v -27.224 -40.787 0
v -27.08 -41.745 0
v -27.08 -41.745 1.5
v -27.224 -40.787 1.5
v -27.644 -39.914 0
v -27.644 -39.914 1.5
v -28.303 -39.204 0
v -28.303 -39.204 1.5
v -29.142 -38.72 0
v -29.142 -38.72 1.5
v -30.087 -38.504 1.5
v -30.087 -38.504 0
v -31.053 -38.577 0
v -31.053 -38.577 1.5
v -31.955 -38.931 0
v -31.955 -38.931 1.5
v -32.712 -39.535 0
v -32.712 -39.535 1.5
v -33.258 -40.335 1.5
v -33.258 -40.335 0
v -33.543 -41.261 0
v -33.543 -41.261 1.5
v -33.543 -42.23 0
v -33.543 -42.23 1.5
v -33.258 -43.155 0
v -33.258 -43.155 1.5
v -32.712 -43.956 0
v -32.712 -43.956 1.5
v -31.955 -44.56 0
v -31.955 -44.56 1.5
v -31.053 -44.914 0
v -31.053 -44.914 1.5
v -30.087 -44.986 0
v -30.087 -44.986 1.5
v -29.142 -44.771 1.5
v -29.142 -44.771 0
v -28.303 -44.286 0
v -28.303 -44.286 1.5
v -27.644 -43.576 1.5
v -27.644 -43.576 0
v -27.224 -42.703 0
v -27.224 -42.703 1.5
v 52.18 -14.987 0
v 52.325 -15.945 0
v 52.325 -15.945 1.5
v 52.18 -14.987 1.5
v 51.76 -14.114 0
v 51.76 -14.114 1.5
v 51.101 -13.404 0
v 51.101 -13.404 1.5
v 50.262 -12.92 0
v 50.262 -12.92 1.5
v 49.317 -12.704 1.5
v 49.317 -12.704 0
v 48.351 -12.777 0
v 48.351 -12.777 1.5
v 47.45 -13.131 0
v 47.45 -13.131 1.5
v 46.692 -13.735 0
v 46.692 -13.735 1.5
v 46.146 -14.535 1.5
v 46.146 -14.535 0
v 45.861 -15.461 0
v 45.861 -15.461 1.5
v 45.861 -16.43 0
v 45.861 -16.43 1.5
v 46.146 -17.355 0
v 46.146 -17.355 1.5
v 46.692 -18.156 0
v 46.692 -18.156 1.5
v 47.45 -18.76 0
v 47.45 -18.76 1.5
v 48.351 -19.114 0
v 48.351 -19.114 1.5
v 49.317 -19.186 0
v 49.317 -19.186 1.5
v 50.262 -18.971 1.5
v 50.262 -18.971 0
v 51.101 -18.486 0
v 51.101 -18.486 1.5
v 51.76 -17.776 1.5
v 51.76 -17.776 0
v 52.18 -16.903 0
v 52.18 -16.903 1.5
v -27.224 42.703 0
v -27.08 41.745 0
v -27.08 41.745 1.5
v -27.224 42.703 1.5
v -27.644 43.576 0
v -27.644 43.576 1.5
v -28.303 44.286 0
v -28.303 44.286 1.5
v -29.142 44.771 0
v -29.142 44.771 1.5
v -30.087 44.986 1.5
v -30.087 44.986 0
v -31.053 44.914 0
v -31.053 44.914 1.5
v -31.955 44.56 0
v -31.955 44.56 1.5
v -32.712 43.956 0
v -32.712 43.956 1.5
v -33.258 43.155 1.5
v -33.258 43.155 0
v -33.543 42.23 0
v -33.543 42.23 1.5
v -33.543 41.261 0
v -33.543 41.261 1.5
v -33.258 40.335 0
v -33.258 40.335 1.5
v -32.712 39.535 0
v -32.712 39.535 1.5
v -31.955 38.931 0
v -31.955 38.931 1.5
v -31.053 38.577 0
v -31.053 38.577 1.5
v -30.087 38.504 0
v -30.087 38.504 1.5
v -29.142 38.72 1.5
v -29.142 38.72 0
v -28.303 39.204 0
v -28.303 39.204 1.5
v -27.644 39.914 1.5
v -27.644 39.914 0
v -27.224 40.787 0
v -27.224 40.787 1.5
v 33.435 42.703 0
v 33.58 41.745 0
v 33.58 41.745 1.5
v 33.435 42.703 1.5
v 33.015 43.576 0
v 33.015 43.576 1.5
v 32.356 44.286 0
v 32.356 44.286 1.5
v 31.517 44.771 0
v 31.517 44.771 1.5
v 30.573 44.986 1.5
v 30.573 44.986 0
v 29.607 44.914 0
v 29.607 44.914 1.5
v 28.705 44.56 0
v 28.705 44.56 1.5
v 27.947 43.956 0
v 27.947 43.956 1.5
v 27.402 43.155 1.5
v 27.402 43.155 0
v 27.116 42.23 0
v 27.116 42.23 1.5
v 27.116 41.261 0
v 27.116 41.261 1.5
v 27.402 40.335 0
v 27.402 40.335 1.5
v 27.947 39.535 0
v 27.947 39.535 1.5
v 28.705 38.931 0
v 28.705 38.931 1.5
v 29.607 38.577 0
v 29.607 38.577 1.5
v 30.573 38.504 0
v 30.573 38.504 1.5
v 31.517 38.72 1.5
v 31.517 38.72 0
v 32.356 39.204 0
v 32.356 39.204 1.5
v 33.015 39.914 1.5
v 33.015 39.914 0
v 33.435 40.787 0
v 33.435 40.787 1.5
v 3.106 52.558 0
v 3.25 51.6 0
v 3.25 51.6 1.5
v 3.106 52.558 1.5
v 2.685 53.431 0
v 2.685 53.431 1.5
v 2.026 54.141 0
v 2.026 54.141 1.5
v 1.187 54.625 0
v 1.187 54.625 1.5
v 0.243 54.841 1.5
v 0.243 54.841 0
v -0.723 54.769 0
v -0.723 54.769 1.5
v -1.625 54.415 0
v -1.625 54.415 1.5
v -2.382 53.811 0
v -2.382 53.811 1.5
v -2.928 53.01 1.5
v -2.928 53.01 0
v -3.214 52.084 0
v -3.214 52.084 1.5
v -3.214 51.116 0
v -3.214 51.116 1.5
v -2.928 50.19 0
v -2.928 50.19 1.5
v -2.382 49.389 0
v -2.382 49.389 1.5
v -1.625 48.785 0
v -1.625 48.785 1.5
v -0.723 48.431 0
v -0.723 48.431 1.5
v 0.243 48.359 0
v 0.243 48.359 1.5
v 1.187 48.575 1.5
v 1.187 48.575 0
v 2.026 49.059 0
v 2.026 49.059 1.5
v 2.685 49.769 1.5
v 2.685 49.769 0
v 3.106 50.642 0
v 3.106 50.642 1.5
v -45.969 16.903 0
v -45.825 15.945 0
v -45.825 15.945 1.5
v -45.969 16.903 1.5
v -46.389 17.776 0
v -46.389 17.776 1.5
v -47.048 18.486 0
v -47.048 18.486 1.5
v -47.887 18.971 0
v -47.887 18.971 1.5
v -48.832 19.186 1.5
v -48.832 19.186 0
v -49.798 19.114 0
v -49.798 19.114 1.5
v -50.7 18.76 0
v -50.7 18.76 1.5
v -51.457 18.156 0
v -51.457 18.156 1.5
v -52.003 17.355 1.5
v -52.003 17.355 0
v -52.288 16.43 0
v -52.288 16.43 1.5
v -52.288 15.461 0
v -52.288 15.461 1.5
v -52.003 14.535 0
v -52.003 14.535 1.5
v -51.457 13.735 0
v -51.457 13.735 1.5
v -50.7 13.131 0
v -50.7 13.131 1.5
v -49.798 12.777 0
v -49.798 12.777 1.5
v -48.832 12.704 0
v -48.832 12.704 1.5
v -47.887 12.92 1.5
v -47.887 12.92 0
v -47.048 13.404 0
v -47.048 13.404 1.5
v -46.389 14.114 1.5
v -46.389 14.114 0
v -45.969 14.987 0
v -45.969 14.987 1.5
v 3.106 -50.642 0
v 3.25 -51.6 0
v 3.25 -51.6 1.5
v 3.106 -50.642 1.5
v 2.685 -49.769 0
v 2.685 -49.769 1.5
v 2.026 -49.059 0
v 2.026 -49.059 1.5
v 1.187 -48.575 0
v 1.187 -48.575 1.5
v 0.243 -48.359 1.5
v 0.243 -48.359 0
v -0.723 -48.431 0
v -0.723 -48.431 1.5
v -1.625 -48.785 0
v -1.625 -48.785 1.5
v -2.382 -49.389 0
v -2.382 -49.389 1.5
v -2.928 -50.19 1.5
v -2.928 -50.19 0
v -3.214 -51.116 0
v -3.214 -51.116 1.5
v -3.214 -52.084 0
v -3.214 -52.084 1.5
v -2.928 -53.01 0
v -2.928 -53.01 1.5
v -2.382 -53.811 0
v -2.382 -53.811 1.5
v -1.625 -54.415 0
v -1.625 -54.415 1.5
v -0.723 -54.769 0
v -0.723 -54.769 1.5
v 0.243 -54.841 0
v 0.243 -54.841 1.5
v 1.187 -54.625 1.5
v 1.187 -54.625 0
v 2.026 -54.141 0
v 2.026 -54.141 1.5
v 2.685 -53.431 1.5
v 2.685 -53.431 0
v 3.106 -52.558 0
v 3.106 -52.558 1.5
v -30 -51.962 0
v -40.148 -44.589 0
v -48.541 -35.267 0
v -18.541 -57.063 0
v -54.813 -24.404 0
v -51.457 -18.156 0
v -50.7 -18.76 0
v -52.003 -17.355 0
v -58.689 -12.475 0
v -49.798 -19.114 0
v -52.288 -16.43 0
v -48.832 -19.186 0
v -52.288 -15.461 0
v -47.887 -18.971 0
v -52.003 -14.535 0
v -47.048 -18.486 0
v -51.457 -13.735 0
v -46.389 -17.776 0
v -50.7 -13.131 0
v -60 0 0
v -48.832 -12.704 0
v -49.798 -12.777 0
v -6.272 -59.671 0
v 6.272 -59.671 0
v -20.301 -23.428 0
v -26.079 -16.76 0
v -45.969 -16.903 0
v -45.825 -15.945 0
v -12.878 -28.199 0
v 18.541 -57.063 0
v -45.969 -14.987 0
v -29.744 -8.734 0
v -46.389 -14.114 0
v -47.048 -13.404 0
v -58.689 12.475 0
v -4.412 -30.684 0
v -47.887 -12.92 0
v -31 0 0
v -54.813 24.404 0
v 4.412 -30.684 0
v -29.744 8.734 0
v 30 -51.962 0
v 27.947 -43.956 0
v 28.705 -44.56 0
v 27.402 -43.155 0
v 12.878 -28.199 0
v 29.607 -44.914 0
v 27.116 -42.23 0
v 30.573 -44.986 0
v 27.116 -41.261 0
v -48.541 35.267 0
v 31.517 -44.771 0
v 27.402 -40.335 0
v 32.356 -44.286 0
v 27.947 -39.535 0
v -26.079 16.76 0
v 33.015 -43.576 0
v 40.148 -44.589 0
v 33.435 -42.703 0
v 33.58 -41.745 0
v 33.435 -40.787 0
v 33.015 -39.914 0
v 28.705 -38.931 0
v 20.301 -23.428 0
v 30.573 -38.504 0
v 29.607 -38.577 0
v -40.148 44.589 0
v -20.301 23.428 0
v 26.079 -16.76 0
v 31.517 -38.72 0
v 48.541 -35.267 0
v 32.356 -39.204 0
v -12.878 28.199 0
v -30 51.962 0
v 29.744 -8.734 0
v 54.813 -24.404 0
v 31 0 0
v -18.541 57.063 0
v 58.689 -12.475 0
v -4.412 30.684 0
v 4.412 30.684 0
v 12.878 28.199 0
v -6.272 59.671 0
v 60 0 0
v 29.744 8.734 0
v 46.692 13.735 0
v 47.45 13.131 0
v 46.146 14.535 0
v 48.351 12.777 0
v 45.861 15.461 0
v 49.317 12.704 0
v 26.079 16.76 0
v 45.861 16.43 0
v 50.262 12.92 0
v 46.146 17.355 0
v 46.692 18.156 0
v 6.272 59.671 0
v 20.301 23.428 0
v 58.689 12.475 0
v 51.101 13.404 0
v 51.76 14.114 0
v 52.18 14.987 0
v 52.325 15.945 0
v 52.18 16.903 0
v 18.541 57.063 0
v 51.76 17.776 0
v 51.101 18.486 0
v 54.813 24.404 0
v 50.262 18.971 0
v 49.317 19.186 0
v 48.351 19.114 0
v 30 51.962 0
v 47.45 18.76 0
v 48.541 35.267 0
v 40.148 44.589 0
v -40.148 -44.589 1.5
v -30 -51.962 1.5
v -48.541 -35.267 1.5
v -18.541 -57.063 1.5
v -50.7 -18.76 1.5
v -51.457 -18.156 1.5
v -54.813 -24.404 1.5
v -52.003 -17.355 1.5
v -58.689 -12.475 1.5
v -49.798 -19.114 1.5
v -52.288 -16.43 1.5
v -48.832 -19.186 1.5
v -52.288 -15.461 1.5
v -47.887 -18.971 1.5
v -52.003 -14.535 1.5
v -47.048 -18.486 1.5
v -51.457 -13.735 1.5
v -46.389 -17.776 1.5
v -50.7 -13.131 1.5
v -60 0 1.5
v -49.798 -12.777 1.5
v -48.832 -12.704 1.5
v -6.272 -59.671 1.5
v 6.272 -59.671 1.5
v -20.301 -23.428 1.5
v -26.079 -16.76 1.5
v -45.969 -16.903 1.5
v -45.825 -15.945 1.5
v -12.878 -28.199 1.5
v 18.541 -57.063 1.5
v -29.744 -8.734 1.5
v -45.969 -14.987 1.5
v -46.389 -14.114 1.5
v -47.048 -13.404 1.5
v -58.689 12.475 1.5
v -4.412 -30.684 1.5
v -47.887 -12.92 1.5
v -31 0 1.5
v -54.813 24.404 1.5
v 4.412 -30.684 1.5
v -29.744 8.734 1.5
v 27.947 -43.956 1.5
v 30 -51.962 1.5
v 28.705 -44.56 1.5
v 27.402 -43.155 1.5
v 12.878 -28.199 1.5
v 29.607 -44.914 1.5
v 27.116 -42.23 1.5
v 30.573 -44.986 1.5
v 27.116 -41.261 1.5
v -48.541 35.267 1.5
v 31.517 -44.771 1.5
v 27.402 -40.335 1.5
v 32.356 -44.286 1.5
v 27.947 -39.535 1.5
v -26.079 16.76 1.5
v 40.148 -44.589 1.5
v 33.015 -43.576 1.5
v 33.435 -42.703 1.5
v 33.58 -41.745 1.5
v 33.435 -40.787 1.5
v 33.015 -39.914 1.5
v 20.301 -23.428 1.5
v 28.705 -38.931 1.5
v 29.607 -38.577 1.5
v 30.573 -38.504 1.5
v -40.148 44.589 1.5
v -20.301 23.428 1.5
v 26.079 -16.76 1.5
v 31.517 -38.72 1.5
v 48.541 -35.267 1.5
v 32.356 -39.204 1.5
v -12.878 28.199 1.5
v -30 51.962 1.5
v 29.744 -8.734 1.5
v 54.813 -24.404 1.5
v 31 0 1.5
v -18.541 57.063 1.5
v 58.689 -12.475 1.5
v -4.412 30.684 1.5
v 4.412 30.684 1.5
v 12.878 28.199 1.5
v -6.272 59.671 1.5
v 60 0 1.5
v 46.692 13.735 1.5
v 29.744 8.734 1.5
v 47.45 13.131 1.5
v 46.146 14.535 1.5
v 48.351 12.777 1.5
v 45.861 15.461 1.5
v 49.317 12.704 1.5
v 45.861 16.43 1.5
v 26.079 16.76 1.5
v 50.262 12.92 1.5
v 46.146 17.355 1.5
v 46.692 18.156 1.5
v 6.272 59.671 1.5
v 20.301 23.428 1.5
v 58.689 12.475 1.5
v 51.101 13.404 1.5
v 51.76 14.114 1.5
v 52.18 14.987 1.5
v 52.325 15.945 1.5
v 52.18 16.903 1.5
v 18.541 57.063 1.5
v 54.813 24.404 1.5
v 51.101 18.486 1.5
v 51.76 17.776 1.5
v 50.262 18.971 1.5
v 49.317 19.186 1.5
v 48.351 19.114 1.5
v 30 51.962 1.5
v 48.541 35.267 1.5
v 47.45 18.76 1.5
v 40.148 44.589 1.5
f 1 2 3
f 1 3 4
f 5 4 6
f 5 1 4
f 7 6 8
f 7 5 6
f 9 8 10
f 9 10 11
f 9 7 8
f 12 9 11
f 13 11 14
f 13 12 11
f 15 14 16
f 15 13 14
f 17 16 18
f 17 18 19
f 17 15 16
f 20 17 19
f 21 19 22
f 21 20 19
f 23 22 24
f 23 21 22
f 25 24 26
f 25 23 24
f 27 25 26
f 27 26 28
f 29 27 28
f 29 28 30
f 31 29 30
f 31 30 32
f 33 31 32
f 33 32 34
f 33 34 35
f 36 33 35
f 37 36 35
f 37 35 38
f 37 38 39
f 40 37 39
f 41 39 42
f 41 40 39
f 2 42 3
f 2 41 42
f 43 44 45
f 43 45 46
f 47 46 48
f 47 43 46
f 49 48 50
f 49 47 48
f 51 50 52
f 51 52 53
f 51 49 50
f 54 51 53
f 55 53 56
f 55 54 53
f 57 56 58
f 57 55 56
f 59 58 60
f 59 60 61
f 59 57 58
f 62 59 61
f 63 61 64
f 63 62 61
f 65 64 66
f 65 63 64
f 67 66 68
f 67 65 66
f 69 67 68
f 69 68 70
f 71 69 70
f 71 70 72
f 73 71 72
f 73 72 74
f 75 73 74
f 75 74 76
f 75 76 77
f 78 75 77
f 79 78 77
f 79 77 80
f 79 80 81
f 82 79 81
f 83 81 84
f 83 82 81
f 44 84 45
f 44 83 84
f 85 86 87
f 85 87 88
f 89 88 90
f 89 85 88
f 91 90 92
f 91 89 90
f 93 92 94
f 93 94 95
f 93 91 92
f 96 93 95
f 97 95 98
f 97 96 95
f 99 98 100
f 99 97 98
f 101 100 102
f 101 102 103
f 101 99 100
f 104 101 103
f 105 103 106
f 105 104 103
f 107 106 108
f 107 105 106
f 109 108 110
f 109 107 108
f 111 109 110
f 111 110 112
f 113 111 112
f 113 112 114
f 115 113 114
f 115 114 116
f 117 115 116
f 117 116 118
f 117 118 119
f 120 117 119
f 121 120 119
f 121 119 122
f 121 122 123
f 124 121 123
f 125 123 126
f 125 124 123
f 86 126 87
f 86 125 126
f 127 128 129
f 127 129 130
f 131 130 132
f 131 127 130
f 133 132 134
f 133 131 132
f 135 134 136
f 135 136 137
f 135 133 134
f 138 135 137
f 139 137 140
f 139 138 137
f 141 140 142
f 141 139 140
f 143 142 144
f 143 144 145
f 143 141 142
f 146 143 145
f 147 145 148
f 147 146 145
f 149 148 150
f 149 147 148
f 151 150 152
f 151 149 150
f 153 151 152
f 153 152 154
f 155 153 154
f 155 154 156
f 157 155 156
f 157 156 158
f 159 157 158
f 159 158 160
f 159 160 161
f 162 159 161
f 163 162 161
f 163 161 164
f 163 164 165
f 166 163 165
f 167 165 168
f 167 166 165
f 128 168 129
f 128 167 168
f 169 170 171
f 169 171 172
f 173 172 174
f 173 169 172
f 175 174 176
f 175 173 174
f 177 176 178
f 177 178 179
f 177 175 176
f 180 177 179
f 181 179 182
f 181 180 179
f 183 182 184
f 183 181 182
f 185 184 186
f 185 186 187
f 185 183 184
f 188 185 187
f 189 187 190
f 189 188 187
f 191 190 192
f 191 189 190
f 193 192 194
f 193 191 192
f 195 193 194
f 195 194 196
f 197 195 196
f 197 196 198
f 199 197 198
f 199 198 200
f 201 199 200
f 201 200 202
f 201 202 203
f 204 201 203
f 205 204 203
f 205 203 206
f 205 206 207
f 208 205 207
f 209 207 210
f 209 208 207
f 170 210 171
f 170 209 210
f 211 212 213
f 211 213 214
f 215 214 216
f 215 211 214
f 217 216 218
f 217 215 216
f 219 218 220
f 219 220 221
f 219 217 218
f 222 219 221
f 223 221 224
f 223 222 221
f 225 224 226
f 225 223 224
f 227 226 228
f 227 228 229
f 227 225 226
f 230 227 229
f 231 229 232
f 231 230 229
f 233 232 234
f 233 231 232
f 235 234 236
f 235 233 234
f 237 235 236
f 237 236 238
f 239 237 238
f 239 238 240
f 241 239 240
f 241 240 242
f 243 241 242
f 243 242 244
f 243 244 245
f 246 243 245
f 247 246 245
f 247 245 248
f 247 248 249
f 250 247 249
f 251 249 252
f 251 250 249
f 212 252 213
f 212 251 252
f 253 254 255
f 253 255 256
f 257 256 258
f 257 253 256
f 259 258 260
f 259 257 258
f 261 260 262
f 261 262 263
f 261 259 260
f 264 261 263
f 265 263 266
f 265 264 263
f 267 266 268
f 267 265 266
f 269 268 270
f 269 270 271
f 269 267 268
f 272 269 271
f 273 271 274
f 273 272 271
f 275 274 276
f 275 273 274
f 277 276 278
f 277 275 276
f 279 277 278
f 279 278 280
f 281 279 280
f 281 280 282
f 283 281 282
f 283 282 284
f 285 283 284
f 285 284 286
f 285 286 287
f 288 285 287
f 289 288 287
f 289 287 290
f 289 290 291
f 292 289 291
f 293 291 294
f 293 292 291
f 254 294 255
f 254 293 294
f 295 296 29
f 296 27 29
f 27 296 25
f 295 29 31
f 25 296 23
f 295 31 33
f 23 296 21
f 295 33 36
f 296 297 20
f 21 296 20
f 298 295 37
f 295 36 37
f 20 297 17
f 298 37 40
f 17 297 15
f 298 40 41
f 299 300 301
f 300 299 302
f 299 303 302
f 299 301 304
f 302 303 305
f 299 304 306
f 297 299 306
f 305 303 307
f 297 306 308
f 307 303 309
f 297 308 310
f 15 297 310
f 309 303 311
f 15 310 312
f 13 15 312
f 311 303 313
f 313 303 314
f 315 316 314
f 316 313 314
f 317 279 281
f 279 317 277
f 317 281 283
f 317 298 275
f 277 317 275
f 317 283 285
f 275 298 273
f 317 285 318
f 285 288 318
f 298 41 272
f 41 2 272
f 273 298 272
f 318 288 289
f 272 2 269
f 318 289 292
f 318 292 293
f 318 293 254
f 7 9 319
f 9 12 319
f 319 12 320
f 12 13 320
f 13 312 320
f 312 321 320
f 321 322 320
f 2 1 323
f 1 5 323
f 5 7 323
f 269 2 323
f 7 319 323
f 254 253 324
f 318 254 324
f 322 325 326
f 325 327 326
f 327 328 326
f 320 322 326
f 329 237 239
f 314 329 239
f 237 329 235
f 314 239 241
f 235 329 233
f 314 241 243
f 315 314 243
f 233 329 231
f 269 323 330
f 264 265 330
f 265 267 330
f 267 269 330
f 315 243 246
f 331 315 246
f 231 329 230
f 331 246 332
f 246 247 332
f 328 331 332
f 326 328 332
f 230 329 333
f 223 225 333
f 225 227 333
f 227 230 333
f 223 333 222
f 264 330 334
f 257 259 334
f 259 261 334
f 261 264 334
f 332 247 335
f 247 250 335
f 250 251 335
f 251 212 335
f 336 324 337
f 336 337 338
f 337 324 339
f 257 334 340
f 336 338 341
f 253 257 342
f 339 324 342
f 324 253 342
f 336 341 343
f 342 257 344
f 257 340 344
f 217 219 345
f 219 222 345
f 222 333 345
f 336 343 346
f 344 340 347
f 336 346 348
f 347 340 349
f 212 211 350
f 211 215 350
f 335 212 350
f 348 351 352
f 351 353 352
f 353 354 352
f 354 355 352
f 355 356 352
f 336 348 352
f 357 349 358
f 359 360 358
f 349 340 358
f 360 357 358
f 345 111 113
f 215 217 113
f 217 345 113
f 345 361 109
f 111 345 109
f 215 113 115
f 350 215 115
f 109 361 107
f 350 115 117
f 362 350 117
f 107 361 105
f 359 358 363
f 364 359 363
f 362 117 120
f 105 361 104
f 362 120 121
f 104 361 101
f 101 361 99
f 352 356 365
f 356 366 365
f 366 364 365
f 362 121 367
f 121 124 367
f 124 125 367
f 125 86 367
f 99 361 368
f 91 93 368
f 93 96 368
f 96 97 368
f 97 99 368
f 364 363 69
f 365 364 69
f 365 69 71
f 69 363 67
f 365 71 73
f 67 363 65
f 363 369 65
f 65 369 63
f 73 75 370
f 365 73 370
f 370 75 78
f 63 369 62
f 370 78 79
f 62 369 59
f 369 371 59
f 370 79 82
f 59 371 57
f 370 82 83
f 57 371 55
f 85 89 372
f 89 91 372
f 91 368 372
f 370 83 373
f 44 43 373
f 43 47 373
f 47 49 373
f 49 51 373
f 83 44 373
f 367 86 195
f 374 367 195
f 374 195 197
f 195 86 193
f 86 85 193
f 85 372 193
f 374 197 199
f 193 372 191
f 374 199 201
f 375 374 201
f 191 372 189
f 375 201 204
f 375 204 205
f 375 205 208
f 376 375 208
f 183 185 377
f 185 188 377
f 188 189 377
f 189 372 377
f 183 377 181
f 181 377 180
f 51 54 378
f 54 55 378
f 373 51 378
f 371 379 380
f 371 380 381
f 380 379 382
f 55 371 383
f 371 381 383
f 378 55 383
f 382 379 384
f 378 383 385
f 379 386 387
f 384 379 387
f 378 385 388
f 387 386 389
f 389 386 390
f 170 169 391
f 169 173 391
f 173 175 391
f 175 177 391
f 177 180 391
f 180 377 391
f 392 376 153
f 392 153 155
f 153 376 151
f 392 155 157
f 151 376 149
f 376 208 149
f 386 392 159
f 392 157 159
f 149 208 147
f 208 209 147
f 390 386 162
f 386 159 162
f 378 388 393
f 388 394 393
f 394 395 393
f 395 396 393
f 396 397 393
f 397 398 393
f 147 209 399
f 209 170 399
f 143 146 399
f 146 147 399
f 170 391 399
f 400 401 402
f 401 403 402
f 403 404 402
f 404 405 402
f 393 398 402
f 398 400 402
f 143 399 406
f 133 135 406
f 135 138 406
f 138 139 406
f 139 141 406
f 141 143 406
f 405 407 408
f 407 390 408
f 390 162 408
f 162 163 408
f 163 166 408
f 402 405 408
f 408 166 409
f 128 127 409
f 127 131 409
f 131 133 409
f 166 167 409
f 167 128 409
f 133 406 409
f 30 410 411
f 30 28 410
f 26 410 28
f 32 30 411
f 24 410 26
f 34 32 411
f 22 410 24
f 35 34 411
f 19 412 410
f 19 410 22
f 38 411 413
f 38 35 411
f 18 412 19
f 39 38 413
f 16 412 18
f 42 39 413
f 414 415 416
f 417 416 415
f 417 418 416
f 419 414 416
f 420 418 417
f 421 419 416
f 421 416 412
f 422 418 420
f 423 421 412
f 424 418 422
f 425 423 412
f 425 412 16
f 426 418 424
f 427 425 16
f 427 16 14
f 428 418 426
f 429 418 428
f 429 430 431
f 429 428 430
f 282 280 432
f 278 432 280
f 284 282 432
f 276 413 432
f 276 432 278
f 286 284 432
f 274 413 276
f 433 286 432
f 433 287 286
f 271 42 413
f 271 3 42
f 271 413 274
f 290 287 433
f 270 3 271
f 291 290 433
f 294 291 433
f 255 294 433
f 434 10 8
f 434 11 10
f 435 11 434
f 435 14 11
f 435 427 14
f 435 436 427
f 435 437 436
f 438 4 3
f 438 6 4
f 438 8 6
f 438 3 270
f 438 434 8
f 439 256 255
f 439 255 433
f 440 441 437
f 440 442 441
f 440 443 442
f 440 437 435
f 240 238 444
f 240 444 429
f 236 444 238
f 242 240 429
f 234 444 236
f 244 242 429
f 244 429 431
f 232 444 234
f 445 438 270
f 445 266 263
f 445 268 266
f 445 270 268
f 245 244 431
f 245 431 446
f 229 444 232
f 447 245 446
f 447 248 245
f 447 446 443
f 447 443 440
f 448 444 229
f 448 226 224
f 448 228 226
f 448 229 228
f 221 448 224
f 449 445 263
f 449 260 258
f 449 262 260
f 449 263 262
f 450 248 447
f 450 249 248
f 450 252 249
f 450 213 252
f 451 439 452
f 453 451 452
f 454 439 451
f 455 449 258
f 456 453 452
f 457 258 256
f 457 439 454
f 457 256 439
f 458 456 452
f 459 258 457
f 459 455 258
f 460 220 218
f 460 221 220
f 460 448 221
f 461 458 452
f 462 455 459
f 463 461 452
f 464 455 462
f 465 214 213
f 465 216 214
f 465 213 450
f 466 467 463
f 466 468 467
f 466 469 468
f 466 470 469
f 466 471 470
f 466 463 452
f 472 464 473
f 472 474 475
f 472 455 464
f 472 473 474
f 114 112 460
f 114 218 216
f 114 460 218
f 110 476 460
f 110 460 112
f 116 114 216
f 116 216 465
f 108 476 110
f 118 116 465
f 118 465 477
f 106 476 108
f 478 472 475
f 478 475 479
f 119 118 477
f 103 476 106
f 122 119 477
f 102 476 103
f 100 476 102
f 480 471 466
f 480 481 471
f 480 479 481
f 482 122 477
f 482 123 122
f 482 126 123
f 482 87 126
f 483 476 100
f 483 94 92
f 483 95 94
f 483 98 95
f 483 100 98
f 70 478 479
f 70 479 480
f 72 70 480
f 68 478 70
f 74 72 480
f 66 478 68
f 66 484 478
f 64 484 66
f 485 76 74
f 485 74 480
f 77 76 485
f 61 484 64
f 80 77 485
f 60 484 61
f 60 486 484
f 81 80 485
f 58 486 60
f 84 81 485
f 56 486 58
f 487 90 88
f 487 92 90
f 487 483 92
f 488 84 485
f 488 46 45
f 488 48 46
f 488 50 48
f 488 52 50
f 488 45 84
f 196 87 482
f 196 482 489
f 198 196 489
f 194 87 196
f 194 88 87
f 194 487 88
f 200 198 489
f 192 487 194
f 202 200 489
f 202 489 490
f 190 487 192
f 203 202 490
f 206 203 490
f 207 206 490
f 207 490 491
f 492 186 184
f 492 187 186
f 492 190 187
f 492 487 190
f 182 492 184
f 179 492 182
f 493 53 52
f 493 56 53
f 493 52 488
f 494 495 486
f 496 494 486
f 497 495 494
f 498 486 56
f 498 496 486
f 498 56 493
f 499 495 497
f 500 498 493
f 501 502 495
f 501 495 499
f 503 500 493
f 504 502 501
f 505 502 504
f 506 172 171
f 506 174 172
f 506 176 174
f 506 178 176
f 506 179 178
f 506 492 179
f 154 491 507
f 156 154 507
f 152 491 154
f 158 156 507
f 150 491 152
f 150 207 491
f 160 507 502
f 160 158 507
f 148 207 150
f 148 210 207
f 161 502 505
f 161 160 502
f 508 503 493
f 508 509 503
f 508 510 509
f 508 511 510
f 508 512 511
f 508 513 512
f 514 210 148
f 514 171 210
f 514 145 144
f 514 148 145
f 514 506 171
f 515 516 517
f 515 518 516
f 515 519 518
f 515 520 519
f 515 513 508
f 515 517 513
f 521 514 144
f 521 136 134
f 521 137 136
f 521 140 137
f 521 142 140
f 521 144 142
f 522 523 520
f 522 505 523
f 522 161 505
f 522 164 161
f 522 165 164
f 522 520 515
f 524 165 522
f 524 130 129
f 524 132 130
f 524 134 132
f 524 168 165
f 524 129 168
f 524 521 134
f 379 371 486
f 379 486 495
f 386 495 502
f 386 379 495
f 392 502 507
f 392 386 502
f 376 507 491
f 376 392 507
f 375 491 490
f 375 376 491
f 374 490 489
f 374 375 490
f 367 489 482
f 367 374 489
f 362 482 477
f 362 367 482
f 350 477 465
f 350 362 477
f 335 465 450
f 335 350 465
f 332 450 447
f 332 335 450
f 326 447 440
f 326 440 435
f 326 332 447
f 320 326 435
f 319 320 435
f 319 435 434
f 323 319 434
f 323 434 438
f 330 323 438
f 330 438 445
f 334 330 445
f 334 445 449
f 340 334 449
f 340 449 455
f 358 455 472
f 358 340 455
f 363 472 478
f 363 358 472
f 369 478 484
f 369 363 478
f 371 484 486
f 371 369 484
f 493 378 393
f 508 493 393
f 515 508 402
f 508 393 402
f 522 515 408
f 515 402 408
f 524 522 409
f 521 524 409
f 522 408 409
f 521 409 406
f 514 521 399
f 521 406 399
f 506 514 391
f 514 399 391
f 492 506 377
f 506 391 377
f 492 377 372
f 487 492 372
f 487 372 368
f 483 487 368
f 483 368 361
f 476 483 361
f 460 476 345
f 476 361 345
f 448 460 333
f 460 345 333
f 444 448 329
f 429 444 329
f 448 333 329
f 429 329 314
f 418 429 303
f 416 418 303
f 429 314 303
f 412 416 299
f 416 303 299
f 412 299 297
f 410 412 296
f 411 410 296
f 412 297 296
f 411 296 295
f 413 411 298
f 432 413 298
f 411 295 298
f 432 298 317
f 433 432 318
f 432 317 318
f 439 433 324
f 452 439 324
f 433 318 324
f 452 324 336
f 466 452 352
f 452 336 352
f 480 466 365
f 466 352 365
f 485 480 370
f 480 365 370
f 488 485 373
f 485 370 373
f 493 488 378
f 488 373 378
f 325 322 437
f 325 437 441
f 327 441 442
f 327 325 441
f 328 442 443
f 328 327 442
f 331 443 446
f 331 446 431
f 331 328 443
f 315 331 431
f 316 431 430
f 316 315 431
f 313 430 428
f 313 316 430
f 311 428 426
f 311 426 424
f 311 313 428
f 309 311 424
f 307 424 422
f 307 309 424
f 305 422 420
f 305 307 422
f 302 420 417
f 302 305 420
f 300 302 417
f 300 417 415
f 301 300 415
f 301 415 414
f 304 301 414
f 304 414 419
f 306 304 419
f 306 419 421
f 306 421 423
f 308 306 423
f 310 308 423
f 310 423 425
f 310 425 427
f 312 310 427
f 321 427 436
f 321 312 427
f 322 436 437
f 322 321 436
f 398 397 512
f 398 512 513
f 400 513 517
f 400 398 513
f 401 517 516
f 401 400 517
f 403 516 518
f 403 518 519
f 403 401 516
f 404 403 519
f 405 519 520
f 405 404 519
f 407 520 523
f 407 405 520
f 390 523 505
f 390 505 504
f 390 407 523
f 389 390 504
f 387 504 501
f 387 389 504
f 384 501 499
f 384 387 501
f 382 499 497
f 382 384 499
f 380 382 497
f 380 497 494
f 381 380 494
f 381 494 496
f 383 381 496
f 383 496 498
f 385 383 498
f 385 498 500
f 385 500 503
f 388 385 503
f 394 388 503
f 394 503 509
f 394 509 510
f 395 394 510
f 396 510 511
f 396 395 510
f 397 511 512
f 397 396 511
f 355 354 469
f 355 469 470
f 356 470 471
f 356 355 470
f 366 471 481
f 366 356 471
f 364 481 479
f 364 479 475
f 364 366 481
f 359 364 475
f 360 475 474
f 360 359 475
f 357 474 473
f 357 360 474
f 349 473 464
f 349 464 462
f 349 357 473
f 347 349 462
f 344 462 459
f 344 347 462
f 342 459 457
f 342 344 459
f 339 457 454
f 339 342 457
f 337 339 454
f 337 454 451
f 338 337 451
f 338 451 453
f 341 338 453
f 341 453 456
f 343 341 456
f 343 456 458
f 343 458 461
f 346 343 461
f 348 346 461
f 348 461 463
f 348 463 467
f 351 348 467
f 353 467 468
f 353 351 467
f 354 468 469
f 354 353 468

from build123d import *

# Parameters (mm, degrees)
SKETCH1_R           = 60
SKETCH1_R_2         = 31
SKETCH1_R_3         = 3.25
BOSS_EXTRUDE1_DEPTH = 1.5


with BuildPart() as part:
    # Sketch1 → Boss-Extrude1 (new body)
    with BuildSketch(Plane.XY):
        Circle(SKETCH1_R)
        Circle(SKETCH1_R_2, mode=Mode.SUBTRACT)
        with Locations((0, 51.6)):
            Circle(SKETCH1_R_3, mode=Mode.SUBTRACT)
        with Locations((30.329719018, 41.74527691)):
            Circle(SKETCH1_R_3, mode=Mode.SUBTRACT)
        with Locations((49.074516241, 15.94527691)):
            Circle(SKETCH1_R_3, mode=Mode.SUBTRACT)
        with Locations((49.074516241, -15.94527691)):
            Circle(SKETCH1_R_3, mode=Mode.SUBTRACT)
        with Locations((30.329719018, -41.74527691)):
            Circle(SKETCH1_R_3, mode=Mode.SUBTRACT)
        with Locations((0, -51.6)):
            Circle(SKETCH1_R_3, mode=Mode.SUBTRACT)
        with Locations((-30.329719018, -41.74527691)):
            Circle(SKETCH1_R_3, mode=Mode.SUBTRACT)
        with Locations((-49.074516241, -15.94527691)):
            Circle(SKETCH1_R_3, mode=Mode.SUBTRACT)
        with Locations((-49.074516241, 15.94527691)):
            Circle(SKETCH1_R_3, mode=Mode.SUBTRACT)
        with Locations((-30.329719018, 41.74527691)):
            Circle(SKETCH1_R_3, mode=Mode.SUBTRACT)
    extrude(amount=BOSS_EXTRUDE1_DEPTH)


solid = part.part
